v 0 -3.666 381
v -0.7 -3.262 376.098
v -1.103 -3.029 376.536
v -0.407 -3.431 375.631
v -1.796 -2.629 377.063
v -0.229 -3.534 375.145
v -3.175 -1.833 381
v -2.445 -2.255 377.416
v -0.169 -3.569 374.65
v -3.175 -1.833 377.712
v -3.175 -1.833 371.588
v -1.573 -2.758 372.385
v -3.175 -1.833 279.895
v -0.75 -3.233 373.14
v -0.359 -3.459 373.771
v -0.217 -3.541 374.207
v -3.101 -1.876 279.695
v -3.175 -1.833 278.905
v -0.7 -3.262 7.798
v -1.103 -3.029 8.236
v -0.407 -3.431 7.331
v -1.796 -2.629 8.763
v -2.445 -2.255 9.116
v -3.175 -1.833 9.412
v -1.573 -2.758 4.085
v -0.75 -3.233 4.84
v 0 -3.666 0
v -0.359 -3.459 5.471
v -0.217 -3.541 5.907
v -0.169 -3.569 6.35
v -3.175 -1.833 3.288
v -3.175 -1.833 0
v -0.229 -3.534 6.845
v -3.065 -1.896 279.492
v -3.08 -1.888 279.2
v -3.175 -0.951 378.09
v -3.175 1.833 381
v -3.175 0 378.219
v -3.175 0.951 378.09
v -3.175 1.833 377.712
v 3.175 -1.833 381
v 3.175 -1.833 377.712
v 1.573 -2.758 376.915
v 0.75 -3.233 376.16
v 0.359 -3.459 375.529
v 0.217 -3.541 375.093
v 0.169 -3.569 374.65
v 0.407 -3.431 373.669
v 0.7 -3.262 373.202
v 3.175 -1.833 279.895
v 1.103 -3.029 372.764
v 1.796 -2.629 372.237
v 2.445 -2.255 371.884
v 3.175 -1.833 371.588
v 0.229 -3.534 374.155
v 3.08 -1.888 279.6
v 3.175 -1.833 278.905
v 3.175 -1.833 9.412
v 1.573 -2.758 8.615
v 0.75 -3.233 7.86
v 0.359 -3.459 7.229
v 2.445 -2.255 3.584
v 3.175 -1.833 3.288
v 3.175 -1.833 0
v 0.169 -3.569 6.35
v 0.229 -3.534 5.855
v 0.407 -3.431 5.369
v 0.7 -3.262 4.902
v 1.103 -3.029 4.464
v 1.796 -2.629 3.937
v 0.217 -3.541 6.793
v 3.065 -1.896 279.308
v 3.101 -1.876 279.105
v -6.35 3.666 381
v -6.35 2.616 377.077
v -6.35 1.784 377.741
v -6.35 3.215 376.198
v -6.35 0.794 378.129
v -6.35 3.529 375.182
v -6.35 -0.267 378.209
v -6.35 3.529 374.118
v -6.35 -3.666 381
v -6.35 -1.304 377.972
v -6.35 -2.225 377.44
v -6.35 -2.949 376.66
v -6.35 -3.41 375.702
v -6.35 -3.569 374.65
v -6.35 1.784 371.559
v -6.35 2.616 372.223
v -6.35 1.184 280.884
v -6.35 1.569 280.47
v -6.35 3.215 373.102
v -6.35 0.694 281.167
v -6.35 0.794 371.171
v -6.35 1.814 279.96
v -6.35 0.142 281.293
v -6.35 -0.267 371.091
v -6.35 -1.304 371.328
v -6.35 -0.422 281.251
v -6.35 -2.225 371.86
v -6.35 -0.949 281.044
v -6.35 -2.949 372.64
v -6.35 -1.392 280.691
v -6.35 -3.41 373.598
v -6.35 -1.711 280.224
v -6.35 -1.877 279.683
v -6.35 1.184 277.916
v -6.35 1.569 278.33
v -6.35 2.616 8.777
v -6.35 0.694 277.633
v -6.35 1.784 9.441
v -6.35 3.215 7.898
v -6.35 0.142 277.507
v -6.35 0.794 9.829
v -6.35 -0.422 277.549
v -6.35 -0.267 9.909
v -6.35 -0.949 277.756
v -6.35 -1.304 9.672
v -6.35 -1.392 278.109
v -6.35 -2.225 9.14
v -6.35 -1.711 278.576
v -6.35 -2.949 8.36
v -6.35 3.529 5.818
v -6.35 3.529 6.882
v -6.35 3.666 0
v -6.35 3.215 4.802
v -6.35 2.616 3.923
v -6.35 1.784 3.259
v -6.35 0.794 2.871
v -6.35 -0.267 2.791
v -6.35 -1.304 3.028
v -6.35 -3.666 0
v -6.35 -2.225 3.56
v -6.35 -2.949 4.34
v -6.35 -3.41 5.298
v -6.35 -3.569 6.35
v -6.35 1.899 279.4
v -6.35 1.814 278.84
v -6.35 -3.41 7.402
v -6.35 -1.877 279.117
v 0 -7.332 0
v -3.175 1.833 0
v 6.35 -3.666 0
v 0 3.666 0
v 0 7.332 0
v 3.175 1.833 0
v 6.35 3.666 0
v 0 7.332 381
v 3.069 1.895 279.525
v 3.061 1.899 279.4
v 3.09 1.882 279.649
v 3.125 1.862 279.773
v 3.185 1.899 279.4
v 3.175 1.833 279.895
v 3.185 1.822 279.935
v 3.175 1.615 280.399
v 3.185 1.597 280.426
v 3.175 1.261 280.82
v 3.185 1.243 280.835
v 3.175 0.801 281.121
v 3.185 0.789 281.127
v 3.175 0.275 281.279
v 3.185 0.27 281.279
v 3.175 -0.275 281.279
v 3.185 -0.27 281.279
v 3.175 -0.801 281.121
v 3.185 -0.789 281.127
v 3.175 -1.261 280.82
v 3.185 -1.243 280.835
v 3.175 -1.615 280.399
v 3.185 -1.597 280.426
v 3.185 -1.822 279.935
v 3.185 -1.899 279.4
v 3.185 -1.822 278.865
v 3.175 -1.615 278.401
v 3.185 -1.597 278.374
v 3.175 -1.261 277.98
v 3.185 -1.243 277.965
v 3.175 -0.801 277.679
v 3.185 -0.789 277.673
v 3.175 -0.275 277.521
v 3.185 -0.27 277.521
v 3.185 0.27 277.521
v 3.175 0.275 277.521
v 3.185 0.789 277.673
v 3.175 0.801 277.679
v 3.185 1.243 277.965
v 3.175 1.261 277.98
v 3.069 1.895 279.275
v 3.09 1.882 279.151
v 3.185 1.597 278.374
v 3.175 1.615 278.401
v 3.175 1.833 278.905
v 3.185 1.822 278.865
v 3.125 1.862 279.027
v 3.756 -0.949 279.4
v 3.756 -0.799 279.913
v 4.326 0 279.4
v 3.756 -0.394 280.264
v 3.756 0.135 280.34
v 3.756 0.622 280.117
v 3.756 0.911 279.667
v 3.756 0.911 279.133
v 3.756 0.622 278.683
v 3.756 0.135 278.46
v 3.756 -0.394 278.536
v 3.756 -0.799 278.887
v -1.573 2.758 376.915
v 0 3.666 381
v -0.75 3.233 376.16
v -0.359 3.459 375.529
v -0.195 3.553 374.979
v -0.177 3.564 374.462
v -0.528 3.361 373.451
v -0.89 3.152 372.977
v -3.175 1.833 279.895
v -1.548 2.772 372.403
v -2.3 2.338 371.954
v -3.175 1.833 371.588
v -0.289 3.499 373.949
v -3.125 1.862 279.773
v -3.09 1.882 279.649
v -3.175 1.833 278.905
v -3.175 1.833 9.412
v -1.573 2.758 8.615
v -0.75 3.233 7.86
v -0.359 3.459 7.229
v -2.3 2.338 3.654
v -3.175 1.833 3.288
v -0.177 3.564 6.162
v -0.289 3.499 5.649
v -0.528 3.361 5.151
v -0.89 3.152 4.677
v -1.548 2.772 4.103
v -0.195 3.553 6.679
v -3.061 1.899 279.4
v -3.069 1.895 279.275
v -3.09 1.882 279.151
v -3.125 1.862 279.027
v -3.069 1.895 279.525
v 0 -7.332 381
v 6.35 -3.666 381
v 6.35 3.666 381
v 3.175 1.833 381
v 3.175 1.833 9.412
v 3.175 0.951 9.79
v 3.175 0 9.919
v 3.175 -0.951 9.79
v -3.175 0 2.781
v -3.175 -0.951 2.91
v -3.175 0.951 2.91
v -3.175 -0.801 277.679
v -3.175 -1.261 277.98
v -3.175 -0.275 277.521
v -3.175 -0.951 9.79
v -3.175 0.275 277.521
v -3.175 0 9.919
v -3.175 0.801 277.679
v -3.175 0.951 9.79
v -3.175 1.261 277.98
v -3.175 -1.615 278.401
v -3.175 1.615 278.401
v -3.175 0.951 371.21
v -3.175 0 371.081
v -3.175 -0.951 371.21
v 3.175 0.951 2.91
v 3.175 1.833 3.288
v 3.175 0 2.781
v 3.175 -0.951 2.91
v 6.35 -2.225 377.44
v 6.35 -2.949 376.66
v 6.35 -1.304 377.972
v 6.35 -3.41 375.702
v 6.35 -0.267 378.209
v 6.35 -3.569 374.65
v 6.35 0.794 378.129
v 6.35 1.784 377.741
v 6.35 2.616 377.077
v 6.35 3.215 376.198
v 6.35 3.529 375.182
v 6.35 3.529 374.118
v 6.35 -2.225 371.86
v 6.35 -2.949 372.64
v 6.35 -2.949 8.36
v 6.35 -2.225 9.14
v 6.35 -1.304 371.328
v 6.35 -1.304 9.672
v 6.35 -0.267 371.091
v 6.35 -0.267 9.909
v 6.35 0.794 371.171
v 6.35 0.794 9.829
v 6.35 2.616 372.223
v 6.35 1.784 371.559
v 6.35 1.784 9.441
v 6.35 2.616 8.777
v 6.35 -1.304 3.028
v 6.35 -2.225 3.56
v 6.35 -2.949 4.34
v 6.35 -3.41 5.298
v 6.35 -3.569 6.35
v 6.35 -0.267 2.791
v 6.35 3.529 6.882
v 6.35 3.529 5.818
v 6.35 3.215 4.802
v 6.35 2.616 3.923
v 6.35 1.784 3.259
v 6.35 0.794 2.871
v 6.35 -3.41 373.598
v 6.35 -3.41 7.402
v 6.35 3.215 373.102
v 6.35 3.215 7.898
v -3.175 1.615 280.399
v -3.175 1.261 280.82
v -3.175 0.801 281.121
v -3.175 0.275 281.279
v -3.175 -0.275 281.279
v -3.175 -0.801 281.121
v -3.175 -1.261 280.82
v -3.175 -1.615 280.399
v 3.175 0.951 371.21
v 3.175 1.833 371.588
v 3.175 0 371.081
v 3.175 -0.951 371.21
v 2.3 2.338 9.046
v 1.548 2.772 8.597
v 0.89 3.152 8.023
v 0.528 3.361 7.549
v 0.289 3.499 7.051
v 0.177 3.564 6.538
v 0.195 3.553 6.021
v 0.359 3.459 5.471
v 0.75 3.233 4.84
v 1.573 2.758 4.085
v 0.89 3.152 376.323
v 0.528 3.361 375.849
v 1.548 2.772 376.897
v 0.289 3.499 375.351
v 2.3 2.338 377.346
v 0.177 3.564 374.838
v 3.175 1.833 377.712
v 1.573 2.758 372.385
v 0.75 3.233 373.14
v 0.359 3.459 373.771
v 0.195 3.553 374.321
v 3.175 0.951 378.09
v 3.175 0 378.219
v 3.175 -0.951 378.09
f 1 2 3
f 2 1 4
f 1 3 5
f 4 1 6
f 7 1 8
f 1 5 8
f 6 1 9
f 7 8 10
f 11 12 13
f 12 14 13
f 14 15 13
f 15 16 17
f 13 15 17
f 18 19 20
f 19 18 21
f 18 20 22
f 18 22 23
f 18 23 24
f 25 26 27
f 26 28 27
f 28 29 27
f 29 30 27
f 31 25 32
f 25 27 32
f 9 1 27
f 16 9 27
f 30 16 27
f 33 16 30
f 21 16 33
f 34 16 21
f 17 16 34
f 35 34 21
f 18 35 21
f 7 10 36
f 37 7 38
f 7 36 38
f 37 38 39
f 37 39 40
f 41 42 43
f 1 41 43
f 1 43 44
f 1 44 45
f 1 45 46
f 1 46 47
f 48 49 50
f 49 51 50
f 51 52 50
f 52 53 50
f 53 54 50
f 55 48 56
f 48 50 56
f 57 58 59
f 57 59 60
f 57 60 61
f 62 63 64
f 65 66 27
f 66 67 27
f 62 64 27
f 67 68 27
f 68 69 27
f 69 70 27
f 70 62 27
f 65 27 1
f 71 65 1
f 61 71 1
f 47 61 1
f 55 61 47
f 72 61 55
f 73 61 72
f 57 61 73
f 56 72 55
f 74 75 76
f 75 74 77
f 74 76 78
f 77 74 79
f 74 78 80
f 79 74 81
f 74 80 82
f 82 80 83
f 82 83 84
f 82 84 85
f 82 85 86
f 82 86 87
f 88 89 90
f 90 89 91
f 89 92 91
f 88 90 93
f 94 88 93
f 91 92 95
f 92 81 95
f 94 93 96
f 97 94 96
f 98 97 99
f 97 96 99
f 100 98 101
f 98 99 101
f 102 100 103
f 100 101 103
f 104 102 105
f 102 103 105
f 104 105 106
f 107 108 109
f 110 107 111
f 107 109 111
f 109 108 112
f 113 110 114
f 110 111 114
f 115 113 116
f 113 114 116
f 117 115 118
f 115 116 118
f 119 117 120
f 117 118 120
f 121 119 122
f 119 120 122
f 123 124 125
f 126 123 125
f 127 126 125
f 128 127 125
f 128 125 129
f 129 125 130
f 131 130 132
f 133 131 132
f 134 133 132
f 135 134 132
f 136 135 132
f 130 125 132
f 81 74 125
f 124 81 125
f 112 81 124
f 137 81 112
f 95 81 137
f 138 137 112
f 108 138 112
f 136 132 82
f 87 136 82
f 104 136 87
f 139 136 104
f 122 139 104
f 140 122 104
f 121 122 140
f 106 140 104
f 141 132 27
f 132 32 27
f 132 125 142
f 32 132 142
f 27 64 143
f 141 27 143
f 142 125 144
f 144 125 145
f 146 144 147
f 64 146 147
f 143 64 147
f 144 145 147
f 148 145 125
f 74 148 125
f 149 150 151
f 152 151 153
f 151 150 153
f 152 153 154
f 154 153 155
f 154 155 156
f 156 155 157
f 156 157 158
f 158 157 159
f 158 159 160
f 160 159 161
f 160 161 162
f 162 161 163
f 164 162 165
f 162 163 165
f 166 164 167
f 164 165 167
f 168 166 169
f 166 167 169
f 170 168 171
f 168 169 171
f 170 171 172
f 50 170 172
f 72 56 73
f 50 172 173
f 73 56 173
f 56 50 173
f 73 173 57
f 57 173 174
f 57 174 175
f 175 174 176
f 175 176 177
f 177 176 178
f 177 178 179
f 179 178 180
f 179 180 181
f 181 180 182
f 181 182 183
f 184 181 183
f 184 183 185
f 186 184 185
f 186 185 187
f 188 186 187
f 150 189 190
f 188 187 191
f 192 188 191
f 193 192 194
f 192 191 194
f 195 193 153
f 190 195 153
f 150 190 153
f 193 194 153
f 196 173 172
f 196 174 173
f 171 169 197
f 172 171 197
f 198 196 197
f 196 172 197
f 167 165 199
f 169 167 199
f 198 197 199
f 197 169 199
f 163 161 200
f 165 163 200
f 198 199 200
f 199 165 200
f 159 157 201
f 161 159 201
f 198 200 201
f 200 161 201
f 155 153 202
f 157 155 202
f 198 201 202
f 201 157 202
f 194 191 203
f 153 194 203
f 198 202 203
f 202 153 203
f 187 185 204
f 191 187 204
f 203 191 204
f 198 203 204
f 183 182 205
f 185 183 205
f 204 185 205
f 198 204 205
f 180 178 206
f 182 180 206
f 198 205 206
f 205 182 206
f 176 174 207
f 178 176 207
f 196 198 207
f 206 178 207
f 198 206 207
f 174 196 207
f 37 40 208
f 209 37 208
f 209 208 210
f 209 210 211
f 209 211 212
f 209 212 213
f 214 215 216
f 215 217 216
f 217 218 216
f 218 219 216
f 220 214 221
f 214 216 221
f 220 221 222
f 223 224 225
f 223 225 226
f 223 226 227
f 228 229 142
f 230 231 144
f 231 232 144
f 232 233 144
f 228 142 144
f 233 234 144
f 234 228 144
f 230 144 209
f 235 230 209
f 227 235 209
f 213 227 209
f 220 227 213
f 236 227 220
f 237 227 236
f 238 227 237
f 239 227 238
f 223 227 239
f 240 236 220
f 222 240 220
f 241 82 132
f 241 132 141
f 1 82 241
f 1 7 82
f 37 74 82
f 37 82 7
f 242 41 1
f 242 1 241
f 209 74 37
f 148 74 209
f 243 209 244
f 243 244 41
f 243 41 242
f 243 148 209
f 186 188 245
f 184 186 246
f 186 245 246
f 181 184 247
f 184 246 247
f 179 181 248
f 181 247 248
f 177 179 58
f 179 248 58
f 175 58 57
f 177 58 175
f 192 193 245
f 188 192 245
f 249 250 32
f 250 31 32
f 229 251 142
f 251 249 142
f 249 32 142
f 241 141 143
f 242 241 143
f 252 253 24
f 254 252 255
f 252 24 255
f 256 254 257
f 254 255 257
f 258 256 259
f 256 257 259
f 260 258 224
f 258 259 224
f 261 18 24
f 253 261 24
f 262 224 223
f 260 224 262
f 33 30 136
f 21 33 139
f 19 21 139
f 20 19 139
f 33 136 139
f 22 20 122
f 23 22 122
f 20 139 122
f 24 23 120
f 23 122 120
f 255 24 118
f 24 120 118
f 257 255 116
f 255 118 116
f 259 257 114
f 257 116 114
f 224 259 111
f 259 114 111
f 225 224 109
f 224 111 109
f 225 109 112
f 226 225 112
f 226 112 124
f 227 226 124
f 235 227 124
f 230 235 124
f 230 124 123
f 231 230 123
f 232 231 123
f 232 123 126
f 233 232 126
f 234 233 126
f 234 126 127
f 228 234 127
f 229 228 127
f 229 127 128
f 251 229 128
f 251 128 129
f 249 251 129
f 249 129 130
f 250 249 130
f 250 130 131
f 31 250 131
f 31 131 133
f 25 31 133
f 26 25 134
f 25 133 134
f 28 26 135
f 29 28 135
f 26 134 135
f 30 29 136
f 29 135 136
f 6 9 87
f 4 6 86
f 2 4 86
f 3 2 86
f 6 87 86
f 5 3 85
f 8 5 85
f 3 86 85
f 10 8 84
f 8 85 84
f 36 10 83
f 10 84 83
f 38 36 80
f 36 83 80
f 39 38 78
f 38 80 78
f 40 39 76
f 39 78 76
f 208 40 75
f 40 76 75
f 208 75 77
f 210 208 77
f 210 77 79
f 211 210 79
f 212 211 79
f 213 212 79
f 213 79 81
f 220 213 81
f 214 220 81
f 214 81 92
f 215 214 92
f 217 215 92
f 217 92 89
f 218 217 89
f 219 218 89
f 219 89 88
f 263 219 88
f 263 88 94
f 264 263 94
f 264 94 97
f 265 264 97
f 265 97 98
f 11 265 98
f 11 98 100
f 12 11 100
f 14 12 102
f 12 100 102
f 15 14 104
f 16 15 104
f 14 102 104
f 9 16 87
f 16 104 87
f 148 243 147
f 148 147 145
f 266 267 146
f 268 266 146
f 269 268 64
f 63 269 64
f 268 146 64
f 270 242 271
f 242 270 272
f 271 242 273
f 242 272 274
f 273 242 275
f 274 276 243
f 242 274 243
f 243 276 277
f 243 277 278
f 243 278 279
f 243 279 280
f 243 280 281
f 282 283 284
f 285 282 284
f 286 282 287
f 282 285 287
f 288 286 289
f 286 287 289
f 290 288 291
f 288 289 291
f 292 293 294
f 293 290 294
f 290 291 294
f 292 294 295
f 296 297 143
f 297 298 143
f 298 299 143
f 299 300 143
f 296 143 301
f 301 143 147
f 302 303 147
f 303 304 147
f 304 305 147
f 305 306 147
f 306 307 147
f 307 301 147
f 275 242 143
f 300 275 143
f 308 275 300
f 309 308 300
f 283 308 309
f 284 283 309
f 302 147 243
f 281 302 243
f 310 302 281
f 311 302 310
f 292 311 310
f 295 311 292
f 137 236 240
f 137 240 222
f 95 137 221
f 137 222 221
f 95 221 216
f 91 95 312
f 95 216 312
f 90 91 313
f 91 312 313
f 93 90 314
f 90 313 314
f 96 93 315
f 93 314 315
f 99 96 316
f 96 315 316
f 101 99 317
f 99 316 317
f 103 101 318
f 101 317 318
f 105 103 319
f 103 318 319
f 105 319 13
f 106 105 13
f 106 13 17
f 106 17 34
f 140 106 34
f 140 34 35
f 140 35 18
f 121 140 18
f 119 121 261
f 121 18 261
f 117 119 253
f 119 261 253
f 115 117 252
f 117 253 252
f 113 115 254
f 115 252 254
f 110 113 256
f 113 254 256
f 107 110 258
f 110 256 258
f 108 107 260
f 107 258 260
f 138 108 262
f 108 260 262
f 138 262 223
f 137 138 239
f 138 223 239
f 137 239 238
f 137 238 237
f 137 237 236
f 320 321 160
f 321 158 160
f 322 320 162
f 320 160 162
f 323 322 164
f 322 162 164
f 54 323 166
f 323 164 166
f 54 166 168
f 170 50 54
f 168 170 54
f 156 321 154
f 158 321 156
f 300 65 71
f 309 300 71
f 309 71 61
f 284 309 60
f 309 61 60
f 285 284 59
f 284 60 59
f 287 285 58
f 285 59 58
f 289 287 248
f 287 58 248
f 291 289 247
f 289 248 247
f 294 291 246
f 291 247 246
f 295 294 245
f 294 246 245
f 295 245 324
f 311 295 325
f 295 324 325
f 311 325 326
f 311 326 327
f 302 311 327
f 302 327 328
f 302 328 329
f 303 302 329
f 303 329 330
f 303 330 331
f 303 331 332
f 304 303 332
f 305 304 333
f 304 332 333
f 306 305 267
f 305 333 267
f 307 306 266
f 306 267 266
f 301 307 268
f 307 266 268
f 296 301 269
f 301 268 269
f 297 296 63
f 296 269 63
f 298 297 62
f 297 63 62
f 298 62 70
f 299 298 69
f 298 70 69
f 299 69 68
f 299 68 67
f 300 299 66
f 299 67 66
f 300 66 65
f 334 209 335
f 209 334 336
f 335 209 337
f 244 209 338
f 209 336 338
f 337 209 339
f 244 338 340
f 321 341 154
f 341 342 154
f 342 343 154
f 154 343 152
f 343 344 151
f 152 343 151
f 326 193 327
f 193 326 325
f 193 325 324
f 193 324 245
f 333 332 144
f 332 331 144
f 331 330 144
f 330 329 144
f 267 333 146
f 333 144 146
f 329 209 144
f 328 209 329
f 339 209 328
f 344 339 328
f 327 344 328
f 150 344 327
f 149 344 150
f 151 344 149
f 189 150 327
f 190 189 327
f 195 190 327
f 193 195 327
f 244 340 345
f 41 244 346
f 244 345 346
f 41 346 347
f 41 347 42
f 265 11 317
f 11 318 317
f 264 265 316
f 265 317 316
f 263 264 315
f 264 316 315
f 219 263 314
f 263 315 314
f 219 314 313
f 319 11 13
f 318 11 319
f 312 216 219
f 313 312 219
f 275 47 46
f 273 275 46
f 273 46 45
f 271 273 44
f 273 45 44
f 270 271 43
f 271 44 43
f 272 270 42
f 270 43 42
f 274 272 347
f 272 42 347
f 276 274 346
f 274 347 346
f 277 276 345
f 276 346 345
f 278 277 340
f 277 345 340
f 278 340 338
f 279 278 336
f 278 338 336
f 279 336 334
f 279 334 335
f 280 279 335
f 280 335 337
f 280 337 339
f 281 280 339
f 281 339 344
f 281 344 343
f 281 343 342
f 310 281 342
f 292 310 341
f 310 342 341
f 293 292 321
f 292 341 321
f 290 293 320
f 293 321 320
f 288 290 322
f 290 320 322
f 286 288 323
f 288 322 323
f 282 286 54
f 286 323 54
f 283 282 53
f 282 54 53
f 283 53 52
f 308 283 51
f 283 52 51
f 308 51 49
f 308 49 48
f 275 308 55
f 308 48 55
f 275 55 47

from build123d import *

# Parameters (mm, degrees)
F1_DEPTH = 381
F3_D     = 7.1374
F5_D     = 3.7973
F5_DEPTH = 9.53516
F5_TIP   = 1.1408240143


with BuildPart() as f1:
    # F0 (on Top) → F1 (new body)
    with BuildSketch(Plane.XY):
        Polygon((6.35, 3.6661742094), (0, 7.3323484187), (-6.35, 3.6661742094), (-6.35, -3.6661742094), (0, -7.3323484187), (6.35, -3.6661742094), align=None)
        Polygon((0, 3.6661742094), (3.175, 1.8330871047), (3.175, -1.8330871047), (0, -3.6661742094), (-3.175, -1.8330871047), (-3.175, 1.8330871047), align=None, mode=Mode.SUBTRACT)
    extrude(amount=F1_DEPTH)

    # F3 (through all)
    with Locations(Plane.YZ.offset(6.35)):
        with Locations((0, 374.65), (0, 6.35)):
            Hole(F3_D / 2)

    # F5
    with Locations(Plane(origin=(-6.35, 0, 0), x_dir=(0, -1, 0), z_dir=(-1, 0, 0))):
        with Locations((0, 279.4)):
            Hole(F5_D / 2, depth=F5_DEPTH)
            with Locations((0, 0, -(F5_DEPTH + F5_TIP / 2))):  # 118° drill point
                Cone(0, F5_D / 2, F5_TIP, mode=Mode.SUBTRACT)


solid = f1.part
